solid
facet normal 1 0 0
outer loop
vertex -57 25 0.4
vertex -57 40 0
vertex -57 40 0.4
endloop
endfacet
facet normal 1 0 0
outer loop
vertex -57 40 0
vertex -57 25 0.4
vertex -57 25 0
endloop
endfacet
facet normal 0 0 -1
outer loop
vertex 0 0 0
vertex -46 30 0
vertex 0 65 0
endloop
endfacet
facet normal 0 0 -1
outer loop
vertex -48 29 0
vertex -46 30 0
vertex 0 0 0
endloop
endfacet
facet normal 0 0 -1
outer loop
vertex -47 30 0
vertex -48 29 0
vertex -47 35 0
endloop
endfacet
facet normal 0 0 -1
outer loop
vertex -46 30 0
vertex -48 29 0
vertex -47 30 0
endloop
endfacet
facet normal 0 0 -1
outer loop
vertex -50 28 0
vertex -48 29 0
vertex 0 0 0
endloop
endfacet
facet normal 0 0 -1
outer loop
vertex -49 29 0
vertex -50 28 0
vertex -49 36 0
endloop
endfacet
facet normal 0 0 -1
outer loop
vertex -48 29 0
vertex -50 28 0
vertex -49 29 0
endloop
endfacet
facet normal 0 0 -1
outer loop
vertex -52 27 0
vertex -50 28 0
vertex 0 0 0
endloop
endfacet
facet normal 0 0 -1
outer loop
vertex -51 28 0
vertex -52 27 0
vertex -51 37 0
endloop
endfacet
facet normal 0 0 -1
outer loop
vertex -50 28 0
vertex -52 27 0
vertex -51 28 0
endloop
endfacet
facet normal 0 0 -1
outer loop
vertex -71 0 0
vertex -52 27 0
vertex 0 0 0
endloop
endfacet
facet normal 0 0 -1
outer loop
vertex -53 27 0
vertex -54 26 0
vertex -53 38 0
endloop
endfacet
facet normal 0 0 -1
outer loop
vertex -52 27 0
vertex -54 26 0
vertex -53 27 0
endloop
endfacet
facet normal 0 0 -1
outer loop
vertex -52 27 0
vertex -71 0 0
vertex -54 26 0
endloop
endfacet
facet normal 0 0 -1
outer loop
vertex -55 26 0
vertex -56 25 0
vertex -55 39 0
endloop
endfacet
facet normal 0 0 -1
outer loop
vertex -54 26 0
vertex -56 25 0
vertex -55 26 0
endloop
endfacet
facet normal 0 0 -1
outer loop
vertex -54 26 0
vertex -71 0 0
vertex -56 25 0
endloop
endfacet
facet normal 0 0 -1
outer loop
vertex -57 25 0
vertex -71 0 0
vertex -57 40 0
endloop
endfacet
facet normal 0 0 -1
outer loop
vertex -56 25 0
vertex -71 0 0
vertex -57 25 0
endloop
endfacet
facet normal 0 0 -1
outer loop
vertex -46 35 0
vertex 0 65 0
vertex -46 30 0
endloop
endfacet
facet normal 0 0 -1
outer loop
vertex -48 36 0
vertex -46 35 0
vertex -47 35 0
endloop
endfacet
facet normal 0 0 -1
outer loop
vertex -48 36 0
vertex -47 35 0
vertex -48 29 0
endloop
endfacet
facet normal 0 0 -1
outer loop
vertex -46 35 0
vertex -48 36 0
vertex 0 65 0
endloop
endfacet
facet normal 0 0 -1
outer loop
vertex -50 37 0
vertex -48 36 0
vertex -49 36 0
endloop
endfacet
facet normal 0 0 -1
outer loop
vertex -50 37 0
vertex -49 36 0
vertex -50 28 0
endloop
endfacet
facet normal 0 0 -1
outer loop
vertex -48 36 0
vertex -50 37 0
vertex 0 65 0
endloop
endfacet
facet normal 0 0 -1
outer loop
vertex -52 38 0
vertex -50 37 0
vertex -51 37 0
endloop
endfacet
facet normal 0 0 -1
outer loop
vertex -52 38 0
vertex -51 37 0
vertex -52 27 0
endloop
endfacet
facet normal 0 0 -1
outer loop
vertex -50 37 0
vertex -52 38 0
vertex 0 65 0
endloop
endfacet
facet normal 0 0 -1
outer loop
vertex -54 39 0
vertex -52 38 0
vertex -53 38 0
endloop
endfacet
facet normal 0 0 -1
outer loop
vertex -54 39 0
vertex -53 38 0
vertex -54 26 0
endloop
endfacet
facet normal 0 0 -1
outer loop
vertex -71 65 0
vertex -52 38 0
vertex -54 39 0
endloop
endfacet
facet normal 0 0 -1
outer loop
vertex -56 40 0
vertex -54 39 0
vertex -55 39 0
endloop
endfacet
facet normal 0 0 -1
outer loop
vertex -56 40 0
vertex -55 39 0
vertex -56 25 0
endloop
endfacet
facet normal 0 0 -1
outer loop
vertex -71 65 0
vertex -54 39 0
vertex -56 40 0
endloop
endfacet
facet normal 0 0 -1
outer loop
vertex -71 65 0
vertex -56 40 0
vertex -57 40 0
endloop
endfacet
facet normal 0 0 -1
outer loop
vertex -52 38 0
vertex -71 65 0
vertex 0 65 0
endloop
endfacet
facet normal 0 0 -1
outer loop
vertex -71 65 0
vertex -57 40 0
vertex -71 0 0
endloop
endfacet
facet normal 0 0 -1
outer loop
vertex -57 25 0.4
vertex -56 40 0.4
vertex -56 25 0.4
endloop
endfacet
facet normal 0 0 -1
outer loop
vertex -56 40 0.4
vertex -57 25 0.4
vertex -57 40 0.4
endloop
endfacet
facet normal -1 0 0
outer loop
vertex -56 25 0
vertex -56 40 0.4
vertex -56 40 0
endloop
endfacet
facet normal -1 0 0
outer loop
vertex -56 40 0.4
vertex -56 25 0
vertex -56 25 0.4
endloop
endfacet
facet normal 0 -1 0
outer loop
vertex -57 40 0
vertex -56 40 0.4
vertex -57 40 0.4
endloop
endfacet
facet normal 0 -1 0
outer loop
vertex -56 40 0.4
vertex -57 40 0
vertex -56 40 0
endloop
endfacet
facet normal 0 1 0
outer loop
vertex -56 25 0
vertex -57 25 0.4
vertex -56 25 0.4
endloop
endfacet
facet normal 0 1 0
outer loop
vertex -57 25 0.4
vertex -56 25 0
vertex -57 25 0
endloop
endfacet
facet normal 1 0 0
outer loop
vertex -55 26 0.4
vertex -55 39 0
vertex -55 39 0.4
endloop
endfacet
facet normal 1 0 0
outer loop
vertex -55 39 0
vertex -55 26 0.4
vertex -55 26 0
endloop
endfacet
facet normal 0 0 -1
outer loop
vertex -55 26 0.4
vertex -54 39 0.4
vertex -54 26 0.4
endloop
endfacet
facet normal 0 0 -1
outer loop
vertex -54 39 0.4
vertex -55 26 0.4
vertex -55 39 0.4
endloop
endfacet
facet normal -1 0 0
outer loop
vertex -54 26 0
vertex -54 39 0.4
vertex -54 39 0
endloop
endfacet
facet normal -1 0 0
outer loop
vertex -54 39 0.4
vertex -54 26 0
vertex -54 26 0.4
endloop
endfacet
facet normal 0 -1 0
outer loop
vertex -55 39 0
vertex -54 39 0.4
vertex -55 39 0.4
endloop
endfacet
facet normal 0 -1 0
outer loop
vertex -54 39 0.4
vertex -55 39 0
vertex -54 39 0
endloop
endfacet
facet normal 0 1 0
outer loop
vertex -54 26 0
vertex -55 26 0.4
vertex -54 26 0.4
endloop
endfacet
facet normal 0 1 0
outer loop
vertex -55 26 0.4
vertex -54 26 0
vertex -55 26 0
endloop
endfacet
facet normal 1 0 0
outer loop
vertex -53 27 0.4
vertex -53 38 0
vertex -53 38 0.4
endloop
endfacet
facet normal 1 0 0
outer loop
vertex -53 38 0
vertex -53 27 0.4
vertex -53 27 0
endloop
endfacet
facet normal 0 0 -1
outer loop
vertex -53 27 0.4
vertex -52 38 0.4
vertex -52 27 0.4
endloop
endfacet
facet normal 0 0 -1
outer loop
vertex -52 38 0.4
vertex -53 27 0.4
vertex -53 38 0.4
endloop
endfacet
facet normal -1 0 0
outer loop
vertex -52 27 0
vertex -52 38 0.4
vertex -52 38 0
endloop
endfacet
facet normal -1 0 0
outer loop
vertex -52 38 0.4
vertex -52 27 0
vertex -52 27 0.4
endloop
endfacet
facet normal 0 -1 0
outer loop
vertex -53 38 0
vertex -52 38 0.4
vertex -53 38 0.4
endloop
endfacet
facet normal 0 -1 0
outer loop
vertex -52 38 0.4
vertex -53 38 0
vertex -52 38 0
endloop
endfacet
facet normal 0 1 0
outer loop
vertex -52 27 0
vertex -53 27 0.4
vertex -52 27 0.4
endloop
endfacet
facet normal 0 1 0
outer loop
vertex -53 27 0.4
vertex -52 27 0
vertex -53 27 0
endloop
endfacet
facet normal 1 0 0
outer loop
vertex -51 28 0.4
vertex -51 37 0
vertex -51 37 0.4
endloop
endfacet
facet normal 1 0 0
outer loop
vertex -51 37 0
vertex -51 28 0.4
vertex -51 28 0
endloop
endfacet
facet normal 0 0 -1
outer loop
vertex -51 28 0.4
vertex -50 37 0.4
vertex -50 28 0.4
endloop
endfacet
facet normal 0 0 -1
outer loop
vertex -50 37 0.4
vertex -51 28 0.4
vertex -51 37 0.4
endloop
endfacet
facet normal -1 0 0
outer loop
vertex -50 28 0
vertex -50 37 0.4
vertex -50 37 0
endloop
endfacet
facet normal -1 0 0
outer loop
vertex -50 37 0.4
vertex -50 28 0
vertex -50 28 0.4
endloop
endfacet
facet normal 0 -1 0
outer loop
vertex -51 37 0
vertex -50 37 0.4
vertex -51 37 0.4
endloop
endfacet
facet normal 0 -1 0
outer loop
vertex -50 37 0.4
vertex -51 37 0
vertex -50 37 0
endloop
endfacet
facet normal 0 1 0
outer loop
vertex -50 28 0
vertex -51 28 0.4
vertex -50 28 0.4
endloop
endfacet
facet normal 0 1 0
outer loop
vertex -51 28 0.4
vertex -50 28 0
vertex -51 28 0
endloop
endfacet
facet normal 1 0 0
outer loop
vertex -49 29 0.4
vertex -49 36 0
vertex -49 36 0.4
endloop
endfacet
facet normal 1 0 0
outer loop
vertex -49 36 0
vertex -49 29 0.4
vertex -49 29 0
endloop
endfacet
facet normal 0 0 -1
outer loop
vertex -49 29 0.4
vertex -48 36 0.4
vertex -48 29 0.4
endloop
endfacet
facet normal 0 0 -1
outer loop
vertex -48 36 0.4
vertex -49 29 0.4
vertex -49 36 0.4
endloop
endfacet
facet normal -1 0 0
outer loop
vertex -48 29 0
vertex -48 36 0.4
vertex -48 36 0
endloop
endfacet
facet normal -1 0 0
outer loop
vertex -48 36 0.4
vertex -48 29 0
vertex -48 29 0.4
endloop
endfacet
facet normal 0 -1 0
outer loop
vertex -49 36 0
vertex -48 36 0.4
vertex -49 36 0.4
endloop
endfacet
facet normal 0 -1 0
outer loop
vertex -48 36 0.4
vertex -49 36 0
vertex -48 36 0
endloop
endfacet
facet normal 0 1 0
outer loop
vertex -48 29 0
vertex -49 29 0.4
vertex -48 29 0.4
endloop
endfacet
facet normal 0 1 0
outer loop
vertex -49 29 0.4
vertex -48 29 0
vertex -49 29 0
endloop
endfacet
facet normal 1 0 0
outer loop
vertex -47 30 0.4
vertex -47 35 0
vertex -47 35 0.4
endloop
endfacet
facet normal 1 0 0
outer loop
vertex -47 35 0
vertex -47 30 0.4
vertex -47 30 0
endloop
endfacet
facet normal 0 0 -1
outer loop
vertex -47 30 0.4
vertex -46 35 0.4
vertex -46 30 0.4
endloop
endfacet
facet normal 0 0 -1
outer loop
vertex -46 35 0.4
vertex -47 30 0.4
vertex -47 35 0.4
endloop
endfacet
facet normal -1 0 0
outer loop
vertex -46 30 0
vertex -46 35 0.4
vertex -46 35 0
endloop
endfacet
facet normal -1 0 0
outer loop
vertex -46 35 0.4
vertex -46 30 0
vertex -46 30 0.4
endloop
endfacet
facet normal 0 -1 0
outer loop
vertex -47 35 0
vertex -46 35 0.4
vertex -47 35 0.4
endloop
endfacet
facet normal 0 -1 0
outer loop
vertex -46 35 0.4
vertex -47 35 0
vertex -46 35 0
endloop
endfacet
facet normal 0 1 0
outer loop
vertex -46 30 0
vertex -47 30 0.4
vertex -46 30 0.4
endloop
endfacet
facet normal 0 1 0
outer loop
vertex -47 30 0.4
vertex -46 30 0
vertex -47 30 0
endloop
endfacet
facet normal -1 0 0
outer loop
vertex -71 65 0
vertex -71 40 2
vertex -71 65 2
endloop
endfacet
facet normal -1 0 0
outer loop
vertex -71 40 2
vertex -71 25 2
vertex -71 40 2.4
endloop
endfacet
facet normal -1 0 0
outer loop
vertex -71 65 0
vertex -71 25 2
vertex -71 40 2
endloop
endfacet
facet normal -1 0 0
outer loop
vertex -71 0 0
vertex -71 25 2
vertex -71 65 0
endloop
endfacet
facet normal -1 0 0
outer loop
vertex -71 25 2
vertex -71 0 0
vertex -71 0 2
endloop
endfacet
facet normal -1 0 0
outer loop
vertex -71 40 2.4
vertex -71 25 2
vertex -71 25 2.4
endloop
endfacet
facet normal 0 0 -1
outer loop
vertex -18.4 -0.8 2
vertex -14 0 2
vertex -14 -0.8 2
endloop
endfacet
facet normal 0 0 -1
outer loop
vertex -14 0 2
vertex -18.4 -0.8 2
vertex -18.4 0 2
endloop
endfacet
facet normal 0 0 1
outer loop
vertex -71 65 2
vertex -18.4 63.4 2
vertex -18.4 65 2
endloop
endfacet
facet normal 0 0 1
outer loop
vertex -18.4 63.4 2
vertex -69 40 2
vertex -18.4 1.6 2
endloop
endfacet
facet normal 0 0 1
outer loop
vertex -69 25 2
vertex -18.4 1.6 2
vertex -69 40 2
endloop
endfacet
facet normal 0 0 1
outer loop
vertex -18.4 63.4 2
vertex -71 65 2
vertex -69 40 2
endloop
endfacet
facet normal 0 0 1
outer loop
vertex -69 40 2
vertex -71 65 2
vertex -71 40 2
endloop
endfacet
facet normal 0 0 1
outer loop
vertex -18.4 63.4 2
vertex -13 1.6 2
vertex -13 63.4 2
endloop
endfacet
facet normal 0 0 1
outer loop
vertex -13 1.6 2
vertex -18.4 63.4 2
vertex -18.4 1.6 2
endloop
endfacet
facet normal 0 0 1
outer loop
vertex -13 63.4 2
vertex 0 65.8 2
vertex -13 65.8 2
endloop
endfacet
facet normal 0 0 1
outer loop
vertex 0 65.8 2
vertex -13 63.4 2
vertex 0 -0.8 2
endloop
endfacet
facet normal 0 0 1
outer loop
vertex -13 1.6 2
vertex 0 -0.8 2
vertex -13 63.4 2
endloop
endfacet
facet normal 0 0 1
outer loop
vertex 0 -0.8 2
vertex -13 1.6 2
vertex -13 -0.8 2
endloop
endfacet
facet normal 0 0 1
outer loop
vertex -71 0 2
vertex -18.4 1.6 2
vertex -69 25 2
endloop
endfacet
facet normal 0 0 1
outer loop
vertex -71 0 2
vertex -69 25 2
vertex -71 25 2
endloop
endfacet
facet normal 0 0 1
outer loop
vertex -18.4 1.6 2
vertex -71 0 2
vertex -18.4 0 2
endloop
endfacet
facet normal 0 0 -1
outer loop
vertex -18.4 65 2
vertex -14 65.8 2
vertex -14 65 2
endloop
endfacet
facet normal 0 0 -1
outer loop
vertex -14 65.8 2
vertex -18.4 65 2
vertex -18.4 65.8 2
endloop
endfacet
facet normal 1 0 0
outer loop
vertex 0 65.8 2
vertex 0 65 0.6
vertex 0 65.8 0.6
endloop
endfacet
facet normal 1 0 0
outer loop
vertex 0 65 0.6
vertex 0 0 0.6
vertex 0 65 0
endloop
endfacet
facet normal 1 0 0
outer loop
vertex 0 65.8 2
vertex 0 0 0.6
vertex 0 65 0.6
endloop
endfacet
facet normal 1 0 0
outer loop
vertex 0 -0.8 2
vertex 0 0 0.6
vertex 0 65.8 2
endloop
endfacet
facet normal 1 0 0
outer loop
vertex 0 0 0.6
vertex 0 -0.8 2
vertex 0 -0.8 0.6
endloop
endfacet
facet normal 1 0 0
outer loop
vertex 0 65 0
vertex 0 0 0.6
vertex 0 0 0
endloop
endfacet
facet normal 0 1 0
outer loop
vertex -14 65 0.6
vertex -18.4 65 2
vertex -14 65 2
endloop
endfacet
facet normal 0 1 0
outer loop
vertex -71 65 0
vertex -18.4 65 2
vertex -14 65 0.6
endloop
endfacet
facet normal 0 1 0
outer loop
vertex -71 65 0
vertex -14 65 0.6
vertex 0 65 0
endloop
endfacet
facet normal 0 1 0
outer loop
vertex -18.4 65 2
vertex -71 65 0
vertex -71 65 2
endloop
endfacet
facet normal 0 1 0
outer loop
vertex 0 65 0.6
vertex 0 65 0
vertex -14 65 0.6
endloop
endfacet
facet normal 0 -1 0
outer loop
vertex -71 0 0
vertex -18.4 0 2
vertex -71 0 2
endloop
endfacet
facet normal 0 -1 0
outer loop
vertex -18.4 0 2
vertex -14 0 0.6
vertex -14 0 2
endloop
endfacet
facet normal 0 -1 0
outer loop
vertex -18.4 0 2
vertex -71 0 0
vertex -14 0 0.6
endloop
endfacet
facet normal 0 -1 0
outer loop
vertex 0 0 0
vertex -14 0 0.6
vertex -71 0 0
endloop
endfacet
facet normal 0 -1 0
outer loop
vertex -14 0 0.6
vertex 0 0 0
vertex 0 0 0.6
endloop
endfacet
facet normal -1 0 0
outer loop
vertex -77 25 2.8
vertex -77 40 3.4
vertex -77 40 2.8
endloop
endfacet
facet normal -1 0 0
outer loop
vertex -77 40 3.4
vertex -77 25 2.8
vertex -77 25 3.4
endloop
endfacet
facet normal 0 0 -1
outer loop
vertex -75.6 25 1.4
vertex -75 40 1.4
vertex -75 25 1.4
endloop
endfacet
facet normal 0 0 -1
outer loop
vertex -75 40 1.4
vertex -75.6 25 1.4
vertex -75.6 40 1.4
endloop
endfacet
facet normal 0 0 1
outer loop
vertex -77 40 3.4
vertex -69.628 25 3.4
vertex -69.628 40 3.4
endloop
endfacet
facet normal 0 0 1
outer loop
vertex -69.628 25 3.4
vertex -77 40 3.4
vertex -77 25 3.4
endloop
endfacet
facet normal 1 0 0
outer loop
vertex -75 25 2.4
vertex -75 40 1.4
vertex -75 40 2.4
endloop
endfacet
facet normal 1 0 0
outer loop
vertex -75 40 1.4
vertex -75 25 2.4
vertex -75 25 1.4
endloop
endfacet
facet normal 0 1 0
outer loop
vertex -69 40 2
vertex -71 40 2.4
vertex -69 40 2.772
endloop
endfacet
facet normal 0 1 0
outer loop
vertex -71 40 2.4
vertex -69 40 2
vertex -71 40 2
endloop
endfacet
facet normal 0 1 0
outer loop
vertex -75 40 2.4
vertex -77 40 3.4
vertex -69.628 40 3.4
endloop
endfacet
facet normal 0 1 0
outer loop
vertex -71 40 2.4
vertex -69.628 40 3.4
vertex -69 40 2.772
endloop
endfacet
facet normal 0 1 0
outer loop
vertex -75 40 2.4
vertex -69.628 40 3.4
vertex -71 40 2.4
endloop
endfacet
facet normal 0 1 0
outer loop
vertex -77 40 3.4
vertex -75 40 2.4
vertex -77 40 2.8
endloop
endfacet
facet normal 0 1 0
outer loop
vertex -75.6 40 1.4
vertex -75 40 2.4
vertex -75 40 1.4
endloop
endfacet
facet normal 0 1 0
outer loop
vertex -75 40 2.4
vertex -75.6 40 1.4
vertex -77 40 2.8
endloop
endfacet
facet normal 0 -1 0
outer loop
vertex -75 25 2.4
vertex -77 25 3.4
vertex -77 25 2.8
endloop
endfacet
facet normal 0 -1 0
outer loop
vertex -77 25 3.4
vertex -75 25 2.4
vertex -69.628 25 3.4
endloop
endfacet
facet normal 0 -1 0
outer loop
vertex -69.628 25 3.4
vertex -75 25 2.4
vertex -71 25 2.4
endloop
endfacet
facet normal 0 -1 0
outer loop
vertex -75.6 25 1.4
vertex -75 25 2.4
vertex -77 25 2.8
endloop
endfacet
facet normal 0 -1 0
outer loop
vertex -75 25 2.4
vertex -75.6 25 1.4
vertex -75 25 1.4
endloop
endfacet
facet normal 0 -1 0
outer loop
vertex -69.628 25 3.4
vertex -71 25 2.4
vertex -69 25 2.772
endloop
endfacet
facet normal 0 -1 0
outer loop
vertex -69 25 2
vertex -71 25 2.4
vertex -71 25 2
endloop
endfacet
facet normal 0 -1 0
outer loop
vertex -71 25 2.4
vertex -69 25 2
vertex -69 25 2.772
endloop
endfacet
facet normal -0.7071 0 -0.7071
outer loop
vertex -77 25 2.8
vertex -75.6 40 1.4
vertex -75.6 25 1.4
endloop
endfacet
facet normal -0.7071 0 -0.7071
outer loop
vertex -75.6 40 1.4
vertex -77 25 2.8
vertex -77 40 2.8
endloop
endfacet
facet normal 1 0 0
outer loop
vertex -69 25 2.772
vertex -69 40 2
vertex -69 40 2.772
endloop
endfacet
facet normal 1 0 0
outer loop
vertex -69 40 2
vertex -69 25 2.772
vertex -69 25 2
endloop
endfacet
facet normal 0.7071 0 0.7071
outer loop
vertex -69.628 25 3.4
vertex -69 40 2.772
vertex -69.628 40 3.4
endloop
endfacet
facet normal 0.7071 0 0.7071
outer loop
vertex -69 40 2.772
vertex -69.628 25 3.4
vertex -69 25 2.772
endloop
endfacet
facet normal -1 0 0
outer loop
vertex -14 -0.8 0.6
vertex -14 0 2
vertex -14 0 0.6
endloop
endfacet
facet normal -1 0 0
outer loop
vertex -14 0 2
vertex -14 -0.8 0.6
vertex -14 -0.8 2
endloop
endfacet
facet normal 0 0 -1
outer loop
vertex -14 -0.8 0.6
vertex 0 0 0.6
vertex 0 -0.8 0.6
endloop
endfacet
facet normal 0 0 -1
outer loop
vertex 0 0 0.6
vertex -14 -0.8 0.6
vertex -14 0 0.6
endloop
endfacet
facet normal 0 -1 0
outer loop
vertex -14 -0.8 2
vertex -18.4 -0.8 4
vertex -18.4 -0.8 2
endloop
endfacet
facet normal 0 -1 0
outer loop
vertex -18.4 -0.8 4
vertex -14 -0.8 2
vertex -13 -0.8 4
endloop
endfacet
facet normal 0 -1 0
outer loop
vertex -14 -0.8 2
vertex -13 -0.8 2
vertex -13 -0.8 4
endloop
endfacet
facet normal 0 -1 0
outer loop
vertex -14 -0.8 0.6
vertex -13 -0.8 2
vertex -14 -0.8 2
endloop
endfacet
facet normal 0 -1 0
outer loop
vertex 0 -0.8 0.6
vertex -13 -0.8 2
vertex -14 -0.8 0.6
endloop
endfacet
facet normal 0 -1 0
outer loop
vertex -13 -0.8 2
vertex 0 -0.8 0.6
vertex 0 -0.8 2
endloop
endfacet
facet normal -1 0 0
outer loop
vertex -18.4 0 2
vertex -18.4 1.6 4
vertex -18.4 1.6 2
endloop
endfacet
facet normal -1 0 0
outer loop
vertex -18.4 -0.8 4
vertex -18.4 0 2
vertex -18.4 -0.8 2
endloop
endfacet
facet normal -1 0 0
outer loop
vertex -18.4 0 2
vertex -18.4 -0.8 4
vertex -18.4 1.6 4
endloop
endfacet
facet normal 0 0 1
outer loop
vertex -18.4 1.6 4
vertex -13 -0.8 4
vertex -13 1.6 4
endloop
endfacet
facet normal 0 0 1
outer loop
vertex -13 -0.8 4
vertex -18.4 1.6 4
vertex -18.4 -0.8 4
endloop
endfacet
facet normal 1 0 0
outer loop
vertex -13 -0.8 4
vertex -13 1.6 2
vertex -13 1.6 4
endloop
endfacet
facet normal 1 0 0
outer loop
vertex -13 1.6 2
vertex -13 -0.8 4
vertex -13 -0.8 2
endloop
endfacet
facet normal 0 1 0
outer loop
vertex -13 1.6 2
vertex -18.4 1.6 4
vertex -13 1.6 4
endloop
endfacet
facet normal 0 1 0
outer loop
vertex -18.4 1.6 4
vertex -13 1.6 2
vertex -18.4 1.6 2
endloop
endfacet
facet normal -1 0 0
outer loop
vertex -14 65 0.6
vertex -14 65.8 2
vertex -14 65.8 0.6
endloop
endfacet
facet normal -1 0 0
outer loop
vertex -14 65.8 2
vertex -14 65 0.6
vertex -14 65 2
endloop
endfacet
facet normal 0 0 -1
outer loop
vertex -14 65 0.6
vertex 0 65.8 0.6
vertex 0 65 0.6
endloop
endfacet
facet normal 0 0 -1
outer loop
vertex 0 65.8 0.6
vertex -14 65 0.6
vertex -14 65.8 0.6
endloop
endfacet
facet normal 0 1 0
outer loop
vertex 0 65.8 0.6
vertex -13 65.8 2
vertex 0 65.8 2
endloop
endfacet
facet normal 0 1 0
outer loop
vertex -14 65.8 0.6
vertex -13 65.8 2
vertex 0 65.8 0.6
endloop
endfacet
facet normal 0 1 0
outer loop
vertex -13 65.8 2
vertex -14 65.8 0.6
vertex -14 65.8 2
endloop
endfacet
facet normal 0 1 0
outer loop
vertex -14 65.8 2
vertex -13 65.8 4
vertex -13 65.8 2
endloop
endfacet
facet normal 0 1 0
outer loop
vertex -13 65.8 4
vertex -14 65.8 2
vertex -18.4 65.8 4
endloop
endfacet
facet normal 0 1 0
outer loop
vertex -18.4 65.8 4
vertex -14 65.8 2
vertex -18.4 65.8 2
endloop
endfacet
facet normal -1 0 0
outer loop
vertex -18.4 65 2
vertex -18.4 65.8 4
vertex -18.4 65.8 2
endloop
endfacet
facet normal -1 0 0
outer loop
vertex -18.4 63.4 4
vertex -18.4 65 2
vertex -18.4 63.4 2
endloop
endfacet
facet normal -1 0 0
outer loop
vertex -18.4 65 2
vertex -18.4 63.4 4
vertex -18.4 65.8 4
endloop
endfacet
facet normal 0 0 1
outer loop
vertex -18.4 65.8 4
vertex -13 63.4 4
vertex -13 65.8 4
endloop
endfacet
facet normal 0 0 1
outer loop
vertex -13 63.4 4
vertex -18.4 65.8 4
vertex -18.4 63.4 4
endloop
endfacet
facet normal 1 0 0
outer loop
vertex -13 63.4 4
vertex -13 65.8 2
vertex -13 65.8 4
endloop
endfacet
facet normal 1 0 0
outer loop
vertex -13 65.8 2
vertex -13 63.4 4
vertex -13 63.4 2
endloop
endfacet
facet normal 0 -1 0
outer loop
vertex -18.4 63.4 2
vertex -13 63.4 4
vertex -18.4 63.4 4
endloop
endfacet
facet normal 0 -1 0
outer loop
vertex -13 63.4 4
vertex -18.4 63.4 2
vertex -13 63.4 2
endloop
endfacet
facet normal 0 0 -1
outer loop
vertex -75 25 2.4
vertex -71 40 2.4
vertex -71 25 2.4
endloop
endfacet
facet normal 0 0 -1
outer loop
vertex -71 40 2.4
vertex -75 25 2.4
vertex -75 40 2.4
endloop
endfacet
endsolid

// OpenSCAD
/* [Global] */

Personalize = "no"; // [yes,no]
Name = "Somebody";	
Address = "Somewhere";

/* [Hidden] */

h = 65;
w = 71;
t = 2;

module cover() {
	difference() {
		cube([w,h,t]);
	
		for (i=[5:2:15]) {	
			translate([w-i-10, h/2-(20-i)/2, 2-.4])
				cube([1,20-i,.4]);
		}
		
		if (Personalize == "yes") {
			translate([w-40, h-32, 2-.4])
				rotate([0,0,-90])
				linear_extrude(height = .4)
					text( "Property of", 
						font = "Arial:style=Bold",
								size=4, 
								$fn=20, 
								valign="center", 
								halign = "center"
							);
			
			translate([w-50, h-32, 2-.4])
				rotate([0,0,-90])
				linear_extrude(height = .4)
					text( Name, 
						font = "Arial:style=Bold",
								size=4, 
								$fn=20, 
								valign="center", 
								halign = "center"
							);
			translate([w-60, h-32, 2-.4])
				rotate([0,0,-90])
				linear_extrude(height = .4)
					text( Address, 
						font = "Arial:style=Bold",
								size=4, 
								$fn=20, 
								valign="center", 
								halign = "center"
							);
		}	
	}
	translate([0,-.8,0])
		cube([14,.8,1.4]);
	
	translate([13,-.8,-2])
		cube([5.4,2.4,2]);
		
	translate([0,h,0])
		cube([14,.8,1.4]);
	
	translate([13,h-1.6,-2])
		cube([5.4,2.4,2]);
		
	translate([w-1,h/2-15/2,-1.4])
		cube([6,15,1]);
	
	difference() {
		translate([w+4,h/2-15/2,-1.4])
			cube([2,15,2]);
		
		translate([w+4+.2,h/2-15/2-.5,1])
		rotate([0,45,0])
			cube([4,16,2]);
	}
	
	
	difference() {
		translate([w-2,h/2-15/2,-1.4])
			cube([2,15,2]);
	
		translate([w-3.8,h/2-15/2-.5,-1.8])
			rotate([0,45,0])
				cube([2.8,16,2]);
	}
}

rotate([0,180,0]) 
	translate([0,0,-2]) 
		cover();
